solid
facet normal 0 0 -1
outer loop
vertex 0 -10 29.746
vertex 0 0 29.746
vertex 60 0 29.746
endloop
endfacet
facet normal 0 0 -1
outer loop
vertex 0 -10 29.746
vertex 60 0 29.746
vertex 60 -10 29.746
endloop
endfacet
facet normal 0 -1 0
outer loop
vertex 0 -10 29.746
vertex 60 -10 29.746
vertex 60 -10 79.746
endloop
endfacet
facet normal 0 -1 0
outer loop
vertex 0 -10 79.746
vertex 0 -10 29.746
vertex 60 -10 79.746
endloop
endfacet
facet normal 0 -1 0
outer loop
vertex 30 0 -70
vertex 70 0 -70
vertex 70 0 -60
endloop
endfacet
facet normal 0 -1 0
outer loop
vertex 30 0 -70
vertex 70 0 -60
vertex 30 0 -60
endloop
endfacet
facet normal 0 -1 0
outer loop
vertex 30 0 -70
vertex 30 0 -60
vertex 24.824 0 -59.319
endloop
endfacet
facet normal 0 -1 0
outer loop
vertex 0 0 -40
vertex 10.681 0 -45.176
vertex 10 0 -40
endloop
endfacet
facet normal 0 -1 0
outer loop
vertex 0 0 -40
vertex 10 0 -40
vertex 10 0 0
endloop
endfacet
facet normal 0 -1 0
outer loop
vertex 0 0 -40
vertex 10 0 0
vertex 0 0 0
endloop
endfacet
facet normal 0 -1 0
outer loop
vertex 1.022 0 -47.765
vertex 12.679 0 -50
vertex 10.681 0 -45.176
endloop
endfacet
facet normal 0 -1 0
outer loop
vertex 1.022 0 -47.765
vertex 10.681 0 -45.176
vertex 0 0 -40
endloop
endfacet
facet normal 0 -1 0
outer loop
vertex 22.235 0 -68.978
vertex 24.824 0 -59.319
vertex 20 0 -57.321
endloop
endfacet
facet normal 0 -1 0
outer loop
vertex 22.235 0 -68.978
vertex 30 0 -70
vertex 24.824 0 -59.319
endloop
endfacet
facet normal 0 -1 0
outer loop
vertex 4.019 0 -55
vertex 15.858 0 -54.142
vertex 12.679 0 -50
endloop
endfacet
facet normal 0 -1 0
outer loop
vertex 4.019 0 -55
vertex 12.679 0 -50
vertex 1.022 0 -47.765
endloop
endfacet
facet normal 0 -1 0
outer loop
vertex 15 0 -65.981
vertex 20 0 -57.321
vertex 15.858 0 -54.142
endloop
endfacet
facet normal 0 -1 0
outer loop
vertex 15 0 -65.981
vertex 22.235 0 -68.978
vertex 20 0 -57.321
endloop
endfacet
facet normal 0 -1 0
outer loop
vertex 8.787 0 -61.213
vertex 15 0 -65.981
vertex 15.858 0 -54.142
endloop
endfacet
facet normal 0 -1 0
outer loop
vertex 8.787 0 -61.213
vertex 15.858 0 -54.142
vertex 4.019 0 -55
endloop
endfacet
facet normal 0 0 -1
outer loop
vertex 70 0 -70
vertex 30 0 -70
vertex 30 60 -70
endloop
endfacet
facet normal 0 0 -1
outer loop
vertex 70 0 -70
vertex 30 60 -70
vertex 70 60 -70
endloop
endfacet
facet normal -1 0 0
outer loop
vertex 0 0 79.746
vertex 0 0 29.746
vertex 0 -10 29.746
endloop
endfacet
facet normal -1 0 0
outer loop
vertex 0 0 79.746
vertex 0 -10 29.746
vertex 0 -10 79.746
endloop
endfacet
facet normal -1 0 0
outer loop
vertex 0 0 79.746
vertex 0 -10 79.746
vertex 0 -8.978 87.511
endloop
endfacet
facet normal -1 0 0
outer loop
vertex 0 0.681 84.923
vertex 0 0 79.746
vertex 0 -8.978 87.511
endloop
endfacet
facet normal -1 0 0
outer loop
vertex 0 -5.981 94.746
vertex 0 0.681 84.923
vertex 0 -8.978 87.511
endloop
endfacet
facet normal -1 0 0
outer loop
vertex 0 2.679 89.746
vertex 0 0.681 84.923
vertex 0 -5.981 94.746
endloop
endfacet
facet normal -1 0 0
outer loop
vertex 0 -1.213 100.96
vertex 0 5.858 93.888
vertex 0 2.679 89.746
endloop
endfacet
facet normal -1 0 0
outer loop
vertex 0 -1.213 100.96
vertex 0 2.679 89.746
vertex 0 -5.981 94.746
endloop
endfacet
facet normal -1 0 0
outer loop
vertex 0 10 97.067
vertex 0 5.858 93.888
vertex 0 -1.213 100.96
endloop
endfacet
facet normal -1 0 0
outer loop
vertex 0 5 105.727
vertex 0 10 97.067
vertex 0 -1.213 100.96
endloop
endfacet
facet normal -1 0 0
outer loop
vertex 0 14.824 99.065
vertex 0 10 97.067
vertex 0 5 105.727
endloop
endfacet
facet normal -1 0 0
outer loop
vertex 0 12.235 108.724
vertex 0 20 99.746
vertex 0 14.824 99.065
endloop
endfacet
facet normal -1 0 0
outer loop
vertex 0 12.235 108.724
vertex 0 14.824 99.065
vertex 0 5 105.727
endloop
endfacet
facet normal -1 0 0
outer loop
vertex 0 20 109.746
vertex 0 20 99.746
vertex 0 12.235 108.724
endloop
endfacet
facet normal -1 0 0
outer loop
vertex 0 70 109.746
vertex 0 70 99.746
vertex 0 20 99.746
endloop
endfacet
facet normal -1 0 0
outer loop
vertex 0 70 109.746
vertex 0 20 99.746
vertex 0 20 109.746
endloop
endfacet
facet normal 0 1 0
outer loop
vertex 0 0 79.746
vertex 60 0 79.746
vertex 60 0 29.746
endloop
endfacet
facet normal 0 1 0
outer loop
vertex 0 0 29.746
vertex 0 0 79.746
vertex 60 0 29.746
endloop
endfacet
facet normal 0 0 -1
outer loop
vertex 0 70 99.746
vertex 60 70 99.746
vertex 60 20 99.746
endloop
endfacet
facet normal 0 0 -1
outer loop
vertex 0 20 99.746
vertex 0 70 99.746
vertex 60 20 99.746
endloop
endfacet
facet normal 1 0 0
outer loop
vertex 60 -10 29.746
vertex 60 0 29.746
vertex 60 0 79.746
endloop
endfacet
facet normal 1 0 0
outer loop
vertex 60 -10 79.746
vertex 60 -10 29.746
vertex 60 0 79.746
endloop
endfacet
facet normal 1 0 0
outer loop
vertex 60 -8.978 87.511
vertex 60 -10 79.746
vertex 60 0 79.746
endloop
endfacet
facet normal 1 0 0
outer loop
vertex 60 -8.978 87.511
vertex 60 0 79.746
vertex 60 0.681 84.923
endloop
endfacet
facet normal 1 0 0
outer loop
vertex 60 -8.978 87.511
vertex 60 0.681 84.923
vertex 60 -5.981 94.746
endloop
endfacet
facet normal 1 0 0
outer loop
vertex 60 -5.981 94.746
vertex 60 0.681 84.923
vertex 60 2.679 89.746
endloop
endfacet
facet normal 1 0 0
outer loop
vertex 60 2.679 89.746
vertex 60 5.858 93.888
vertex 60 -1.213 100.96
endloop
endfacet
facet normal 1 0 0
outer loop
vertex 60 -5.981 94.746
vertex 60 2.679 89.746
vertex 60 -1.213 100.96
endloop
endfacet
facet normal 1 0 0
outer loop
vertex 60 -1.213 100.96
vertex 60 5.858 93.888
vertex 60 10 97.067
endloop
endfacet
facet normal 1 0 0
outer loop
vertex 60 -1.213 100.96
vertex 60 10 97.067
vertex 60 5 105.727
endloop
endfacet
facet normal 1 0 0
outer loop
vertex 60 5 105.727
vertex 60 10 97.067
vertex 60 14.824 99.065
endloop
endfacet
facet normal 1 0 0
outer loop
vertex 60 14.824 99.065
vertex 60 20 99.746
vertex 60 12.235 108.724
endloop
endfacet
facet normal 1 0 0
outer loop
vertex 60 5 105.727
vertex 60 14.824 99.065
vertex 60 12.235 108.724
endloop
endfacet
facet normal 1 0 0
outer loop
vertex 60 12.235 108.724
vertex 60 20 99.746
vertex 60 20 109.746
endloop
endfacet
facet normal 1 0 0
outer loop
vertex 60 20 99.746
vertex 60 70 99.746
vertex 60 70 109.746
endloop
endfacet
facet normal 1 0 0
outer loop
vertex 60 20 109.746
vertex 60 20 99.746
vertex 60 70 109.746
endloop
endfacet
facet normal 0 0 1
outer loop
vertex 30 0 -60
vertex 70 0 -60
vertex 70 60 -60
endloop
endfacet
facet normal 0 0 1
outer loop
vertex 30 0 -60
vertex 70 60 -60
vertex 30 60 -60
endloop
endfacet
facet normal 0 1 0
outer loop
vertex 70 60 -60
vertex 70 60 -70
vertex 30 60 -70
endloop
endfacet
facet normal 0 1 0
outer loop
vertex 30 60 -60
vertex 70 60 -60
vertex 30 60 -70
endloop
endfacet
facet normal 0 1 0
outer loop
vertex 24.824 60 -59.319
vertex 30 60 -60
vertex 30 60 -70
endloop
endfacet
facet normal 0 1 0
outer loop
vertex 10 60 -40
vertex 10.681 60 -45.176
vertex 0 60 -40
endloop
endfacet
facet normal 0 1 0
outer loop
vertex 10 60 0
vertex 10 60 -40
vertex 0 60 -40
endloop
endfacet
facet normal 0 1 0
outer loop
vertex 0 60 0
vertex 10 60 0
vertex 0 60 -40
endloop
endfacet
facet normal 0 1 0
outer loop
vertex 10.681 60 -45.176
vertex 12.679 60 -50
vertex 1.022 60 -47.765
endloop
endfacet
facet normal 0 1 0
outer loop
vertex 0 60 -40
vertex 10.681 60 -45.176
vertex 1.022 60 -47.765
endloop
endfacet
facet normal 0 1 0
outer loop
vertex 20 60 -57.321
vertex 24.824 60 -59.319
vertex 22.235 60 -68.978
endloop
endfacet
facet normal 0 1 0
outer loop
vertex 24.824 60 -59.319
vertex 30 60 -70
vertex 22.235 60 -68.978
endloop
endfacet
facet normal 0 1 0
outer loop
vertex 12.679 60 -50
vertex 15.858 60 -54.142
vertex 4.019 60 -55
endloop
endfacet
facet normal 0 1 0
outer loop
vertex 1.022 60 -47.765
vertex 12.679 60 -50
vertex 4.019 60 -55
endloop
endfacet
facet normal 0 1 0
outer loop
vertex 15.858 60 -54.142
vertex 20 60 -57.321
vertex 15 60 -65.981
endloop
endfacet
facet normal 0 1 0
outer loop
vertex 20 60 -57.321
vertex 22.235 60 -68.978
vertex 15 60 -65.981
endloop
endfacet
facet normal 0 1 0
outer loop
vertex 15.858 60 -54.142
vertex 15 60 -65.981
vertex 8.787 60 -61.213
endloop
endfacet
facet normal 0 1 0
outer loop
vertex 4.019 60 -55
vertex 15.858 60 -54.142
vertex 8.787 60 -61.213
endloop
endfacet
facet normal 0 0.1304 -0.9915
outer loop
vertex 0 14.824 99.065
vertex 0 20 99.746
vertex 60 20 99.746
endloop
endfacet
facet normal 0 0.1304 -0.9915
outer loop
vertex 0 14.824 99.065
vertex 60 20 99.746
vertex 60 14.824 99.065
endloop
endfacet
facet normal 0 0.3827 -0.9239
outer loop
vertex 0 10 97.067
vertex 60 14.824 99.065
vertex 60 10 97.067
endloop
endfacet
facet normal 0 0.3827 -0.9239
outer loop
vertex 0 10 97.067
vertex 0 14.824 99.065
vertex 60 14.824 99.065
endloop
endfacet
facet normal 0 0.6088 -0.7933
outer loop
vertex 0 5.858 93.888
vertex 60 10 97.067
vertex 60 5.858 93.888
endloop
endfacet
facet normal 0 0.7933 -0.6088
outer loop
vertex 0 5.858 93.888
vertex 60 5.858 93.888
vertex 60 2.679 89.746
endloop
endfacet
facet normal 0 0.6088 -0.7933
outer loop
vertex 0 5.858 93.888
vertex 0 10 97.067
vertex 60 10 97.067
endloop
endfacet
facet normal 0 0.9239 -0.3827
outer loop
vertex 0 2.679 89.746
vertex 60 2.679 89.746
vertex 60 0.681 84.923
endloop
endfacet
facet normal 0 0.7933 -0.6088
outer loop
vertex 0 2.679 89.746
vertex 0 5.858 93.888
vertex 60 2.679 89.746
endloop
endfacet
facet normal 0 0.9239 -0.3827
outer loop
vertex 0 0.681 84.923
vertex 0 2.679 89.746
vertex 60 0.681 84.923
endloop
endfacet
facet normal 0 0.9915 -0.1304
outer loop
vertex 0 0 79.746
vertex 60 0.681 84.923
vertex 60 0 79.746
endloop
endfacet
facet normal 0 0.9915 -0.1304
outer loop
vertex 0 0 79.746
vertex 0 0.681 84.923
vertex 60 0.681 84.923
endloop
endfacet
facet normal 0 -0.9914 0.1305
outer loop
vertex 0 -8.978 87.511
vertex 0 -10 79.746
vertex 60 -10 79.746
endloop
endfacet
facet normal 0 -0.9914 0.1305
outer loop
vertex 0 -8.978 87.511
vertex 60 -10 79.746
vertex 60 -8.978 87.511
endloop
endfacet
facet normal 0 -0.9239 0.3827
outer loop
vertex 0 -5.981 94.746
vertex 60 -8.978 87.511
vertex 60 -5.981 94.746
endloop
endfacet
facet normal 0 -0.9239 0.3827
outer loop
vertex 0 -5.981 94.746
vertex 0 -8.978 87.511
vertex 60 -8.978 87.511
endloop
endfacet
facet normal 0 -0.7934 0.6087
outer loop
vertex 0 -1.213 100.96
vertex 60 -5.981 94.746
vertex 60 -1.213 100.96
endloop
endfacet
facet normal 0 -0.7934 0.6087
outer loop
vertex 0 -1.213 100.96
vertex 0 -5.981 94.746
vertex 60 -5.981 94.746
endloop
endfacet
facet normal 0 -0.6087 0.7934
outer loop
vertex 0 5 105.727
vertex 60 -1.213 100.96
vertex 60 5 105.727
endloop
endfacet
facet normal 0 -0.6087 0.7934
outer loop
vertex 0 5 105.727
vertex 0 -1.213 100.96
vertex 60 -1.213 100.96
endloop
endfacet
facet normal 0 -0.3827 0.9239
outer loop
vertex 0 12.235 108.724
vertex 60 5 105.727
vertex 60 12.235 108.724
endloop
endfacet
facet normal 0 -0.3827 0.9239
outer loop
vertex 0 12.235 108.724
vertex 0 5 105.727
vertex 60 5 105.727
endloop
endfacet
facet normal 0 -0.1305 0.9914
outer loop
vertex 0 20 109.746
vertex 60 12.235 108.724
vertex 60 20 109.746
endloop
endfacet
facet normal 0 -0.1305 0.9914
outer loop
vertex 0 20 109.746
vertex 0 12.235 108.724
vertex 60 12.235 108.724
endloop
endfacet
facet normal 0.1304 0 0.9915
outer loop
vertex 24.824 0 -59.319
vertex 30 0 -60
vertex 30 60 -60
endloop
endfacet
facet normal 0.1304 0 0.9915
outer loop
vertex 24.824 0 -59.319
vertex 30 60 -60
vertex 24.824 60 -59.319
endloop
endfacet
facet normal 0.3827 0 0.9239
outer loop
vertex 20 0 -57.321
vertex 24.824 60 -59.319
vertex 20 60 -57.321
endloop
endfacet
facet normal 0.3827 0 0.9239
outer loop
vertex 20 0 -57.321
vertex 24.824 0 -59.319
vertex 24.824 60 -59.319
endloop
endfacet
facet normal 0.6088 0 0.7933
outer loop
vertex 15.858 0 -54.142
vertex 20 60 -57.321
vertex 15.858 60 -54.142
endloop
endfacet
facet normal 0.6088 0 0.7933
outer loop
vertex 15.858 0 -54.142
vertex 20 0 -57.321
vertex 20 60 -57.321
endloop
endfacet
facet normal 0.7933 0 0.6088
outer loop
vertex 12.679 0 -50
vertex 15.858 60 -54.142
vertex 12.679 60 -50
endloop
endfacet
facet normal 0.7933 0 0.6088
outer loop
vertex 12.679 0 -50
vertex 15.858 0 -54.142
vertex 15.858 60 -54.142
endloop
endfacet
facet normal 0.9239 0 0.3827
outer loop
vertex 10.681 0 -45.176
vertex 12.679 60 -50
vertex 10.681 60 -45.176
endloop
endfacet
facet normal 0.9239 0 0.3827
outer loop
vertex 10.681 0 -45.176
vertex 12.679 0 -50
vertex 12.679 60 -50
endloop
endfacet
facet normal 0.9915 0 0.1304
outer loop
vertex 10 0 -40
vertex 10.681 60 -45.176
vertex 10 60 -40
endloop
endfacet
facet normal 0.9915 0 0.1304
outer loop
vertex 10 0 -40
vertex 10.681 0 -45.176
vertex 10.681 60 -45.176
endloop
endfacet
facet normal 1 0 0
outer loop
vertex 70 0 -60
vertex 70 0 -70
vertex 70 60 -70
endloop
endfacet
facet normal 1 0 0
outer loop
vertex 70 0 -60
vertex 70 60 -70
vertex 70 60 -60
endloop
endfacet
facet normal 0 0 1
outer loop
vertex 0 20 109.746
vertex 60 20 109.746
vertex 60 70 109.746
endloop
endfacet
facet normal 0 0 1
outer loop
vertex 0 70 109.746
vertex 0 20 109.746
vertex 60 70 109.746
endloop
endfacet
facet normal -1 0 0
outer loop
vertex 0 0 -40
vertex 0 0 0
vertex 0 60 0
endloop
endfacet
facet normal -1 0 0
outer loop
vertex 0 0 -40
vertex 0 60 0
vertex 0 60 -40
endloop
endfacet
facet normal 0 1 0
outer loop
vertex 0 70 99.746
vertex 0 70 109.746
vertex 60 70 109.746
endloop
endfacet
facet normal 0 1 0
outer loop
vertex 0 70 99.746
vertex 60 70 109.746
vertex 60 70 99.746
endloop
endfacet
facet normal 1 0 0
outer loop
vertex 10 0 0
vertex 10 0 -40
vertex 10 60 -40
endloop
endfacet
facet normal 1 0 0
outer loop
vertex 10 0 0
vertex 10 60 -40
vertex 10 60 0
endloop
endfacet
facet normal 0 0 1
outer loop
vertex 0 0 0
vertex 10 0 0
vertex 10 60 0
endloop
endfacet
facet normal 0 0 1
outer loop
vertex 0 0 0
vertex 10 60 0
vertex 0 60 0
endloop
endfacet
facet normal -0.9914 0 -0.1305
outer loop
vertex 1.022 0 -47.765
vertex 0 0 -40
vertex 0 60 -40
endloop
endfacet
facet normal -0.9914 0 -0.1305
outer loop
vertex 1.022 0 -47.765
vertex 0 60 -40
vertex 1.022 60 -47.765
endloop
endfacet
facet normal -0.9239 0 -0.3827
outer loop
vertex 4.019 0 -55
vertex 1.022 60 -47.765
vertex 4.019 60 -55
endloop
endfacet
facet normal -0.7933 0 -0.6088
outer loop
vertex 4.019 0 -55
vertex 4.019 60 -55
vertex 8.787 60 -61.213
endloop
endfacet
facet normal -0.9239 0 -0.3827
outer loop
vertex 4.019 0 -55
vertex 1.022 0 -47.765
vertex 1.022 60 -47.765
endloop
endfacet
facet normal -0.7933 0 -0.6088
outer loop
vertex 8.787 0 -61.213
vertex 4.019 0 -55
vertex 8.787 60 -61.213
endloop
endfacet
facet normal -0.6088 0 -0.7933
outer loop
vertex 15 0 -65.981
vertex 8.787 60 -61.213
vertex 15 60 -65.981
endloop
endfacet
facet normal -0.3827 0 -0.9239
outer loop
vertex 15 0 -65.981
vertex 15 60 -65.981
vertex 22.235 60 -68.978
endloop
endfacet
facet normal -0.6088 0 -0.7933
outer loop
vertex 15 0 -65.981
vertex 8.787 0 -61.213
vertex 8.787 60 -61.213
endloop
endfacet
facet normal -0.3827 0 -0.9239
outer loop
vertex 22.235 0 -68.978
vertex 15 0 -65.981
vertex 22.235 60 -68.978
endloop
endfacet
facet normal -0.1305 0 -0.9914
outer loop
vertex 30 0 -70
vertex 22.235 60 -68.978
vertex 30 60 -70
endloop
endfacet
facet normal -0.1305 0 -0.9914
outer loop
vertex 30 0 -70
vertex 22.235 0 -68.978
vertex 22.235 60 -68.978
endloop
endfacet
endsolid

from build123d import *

# Parameters (mm, degrees)
BASE_FLANGE1_DEPTH = 60
BASE_FLANGE2_DEPTH = 60


# Sheet-metal steps are written as plain solids
with BuildPart() as part:
    # Sketch2 → Base-Flange1 (new body)
    with BuildSketch(Plane(origin=(0, 0, 0), x_dir=(1, 0, 0), z_dir=(0, 1, 0))):
        with BuildLine():
            Line((0, 0), (0, 40))
            ThreePointArc((0, 40), (8.786796564, 61.213203436), (30, 70))
            Line((30, 70), (70, 70))
            Line((70, 70), (70, 60))
            Line((70, 60), (30, 60))
            ThreePointArc((30, 60), (15.857864376, 54.142135624), (10, 40))
            Line((10, 40), (10, 0))
            Line((10, 0), (0, 0))
        make_face()
    extrude(amount=BASE_FLANGE1_DEPTH)


with BuildPart() as body_2:
    # Sketch7 → Base-Flange2 (new body)
    with BuildSketch(Plane(origin=(0, 0, 0), x_dir=(0, 0, -1), z_dir=(1, 0, 0))):
        with BuildLine():
            Line((-99.746355884, 70), (-99.746355884, 20))
            ThreePointArc((-99.746355884, 20), (-93.888491507, 5.857864376), (-79.746355884, 0))
            Line((-79.746355884, 0), (-29.746355884, 0))
            Line((-29.746355884, 0), (-29.746355884, -10))
            Line((-29.746355884, -10), (-79.746355884, -10))
            ThreePointArc((-79.746355884, -10), (-100.959559319, -1.213203436), (-109.746355884, 20))
            Line((-109.746355884, 20), (-109.746355884, 70))
            Line((-109.746355884, 70), (-99.746355884, 70))
        make_face()
    extrude(amount=BASE_FLANGE2_DEPTH)


solid = Compound([part.part, body_2.part])
